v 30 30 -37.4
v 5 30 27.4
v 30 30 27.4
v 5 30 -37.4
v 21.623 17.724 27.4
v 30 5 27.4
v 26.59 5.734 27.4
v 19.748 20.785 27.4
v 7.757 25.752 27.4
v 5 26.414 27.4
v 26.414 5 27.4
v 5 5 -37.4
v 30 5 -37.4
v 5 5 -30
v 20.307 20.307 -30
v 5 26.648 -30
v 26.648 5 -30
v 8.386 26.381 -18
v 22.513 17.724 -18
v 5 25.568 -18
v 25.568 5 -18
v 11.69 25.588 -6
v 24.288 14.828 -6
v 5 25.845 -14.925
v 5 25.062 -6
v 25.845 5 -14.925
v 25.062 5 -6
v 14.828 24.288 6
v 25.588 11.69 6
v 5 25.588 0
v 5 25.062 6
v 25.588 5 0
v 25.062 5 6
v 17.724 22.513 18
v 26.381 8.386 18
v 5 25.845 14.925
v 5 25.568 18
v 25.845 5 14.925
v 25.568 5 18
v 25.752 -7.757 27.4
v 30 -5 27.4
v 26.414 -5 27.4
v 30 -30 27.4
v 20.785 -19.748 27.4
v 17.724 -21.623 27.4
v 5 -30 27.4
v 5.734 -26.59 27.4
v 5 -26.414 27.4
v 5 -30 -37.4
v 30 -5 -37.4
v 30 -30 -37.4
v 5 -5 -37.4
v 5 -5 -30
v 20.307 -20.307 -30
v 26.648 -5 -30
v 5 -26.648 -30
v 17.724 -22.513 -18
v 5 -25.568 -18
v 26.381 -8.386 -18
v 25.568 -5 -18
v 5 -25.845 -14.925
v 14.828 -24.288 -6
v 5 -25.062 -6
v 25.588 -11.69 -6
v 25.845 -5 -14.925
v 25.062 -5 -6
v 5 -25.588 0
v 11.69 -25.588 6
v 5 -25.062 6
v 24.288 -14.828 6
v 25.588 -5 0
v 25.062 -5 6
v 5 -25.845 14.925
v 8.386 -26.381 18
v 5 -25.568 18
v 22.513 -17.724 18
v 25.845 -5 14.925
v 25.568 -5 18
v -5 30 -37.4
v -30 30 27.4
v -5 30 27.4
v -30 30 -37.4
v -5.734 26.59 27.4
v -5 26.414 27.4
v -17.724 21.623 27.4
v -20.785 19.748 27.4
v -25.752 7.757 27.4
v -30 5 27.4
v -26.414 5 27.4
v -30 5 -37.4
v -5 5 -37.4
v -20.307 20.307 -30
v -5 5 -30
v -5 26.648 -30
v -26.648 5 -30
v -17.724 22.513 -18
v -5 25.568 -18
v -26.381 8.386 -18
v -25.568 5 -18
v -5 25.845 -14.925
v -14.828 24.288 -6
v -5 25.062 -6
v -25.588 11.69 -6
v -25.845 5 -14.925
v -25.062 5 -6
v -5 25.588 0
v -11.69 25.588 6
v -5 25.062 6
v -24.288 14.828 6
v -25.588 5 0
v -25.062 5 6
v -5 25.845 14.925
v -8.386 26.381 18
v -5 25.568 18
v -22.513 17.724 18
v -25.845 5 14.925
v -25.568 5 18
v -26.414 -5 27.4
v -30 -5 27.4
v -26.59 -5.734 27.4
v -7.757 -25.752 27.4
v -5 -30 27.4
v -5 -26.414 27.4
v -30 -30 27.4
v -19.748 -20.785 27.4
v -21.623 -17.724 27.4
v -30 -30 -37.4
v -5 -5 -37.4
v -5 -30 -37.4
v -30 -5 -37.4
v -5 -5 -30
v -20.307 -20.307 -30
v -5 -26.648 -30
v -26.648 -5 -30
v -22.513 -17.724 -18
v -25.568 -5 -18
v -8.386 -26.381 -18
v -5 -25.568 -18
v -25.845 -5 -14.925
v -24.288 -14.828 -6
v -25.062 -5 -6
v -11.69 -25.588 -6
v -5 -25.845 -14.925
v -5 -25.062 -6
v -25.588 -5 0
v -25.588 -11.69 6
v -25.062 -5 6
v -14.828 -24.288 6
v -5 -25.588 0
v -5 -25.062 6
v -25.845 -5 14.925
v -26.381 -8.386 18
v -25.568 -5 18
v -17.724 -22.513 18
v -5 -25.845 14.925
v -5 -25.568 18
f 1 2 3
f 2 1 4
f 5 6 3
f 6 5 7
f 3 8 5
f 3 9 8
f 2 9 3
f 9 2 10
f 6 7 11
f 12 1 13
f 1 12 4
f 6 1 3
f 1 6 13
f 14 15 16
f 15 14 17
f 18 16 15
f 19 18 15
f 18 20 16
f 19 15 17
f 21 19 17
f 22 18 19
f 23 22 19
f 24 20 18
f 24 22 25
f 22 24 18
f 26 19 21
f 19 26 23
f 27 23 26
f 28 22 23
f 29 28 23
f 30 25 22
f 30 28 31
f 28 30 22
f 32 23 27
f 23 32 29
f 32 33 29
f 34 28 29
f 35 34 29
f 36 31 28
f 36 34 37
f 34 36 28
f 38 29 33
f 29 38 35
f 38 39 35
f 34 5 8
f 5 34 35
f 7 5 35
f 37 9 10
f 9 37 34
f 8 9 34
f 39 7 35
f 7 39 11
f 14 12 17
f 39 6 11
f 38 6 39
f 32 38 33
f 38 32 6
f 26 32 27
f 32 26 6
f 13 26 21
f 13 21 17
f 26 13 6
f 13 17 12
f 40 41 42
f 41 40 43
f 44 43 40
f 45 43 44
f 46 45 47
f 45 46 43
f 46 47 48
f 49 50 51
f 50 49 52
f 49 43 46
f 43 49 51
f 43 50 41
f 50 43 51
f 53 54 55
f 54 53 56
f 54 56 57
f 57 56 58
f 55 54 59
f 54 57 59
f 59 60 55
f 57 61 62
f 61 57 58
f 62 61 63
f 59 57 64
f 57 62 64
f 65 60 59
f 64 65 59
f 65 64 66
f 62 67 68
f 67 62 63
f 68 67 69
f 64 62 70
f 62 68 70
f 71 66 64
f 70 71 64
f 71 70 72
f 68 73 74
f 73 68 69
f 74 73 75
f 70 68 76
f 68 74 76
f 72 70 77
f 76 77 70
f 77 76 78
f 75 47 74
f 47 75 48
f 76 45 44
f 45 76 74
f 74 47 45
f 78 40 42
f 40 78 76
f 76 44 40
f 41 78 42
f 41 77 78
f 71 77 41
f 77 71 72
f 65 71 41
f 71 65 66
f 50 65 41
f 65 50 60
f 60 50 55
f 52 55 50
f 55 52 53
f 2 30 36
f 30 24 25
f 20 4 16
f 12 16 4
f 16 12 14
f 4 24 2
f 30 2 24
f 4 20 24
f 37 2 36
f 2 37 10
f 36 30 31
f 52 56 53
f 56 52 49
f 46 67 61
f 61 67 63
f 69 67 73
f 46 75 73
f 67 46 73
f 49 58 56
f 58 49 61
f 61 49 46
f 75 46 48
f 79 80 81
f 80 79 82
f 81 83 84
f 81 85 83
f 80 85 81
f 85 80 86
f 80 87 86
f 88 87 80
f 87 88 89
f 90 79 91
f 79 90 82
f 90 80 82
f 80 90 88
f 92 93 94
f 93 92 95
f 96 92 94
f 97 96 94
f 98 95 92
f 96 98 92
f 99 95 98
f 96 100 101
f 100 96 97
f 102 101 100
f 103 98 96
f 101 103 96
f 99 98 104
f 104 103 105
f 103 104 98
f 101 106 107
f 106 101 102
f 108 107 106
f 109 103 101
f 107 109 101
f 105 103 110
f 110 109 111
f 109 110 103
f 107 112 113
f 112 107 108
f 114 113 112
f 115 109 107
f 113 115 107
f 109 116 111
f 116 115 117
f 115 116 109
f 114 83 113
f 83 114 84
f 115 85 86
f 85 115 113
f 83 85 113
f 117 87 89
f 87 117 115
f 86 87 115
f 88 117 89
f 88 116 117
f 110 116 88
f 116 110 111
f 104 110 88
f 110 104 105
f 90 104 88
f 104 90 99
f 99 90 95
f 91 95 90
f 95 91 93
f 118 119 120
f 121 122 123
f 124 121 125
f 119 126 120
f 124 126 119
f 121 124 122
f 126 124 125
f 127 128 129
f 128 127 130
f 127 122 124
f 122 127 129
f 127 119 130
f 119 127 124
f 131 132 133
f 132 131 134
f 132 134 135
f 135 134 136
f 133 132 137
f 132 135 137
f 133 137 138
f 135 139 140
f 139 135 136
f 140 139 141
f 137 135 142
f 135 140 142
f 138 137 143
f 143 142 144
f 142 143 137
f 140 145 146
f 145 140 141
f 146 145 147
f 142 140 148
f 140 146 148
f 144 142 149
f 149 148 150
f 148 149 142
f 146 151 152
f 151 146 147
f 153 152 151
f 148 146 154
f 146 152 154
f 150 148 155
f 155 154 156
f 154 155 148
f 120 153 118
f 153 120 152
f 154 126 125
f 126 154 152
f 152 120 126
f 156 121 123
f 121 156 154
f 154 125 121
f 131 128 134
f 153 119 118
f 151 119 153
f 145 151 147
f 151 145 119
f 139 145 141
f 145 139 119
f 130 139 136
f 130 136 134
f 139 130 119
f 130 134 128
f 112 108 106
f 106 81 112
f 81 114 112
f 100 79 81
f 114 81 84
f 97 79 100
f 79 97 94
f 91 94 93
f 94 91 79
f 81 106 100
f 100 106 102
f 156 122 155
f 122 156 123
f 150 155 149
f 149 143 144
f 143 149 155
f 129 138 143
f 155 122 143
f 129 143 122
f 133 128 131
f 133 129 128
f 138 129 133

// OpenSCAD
// file: ../lib/extrude_directional.scad
/*
Copyright (C) Saeed Gholami Shahbandi. All rights reserved.
Author: Saeed Gholami Shahbandi (saeed.gh.sh@gmail.com)

This file is part of Arrangement Library.
The of Arrangement Library is free software: you can redistribute it and/or
modify it under the terms of the GNU Lesser General Public License as published
by the Free Software Foundation, either version 3 of the License,
or (at your option) any later version.

This program is distributed in the hope that it will be useful, but WITHOUT ANY
WARRANTY; without even the implied warranty of MERCHANTABILITY or FITNESS FOR A
PARTICULAR PURPOSE. See the GNU Lesser General Public License for more details.

You should have received a copy of the GNU Lesser General Public License along
with this program. If not, see <http://www.gnu.org/licenses/>
*/
tol = 0.01;

// Extrudes the shadow of the object projected at yz plan
module extrude_along_x(length=0)
{
    union(){
        // original object
        children();
        
        // extrusion of the object
        translate([max(0, length), 0, 0])
        rotate([0, -90, 0])
        linear_extrude(height=abs(length), center=false)
        projection()
        rotate([0, 90, 0])
        children();
    }    
}

// Extrudes the shadow of the object projected at zx plan
module extrude_along_y(length=0)
{
    union(){
        // original object
        children();
        
        // extrusion of the object
        rotate([-sign(length) * 90, 0, 0])
        linear_extrude(height=abs(length), center=false)
        projection()
        rotate([sign(length) * 90, 0, 0])
        children();
    }    
}

// Extrudes the shadow of the object projected at xy plan
module extrude_along_z(length=0)
{
    union(){
        // original object
        children();
        
        // extrusion of the object
        translate([0, 0, min(0, length)])
        linear_extrude(height=abs(length), center=false)
        projection()
        children();
    }    
}

// examples
module toy_example(size=5)
{
    union(){
        cube(2*size, true);

        translate([size, 0, 0])
        sphere(size);
        translate([-size, 0, 0])
        sphere(size);
        
        translate([0, size, 0])
        sphere(size);
        translate([0, -size, 0])
        sphere(size);
        
        translate([0, 0, size])
        sphere(size);
        translate([0, 0, -size])
        sphere(size);
    }
}


%extrude_along_x(length=20)
translate([0, 20, 0])
toy_example(size=5);

%extrude_along_y(length=20)
translate([0, 0, 20])
toy_example(size=5);

%extrude_along_z(length=20)
translate([20, 0, 0])
toy_example(size=5);
// file: ../lib/splitter.scad
/*
Copyright (C) Saeed Gholami Shahbandi. All rights reserved.
Author: Saeed Gholami Shahbandi (saeed.gh.sh@gmail.com)

This file is part of Arrangement Library.
The of Arrangement Library is free software: you can redistribute it and/or
modify it under the terms of the GNU Lesser General Public License as published
by the Free Software Foundation, either version 3 of the License,
or (at your option) any later version.

This program is distributed in the hope that it will be useful, but WITHOUT ANY
WARRANTY; without even the implied warranty of MERCHANTABILITY or FITNESS FOR A
PARTICULAR PURPOSE. See the GNU Lesser General Public License for more details.

You should have received a copy of the GNU Lesser General Public License along
with this program. If not, see <http://www.gnu.org/licenses/>
*/
tol = 0.01;
use <extrude_directional.scad>

// Retuns a split of the object[s], cut by the yz plane
// If offset is set, the split parts are spaced accordingly for better visual
module split_along_yz(max_size, offset=0)
{
    // split along x=0
    union(){
        // positive side
        translate([offset, 0, 0])
        intersection()
        {
            translate([max_size/2, 0, 0])
            cube(max_size, true);
            children();
        }
        
        // negative side
        translate([-offset, 0, 0])
        intersection()
        {
            translate([-max_size/2, 0, 0])
            cube(max_size, true);
            children();
        }
    }    
}

// examples
%split_along_yz(max_size=20, offset=1)
toy_example(size=5);
// file: ../lib/shapes.scad
/*
Copyright (C) Saeed Gholami Shahbandi. All rights reserved.
Author: Saeed Gholami Shahbandi (saeed.gh.sh@gmail.com)

This file is part of Arrangement Library.
The of Arrangement Library is free software: you can redistribute it and/or
modify it under the terms of the GNU Lesser General Public License as published
by the Free Software Foundation, either version 3 of the License,
or (at your option) any later version.

This program is distributed in the hope that it will be useful, but WITHOUT ANY
WARRANTY; without even the implied warranty of MERCHANTABILITY or FITNESS FOR A
PARTICULAR PURPOSE. See the GNU Lesser General Public License for more details.

You should have received a copy of the GNU Lesser General Public License along
with this program. If not, see <http://www.gnu.org/licenses/>
*/
tol = 0.01;

// Returns a regular polygon, centered at origin, where radius is the
// distance from center to the middle of edges
module regularPolygon(order, radius)
{
    // the radius is from center to middle of edge
    // node_radius is from center to node
    node_radius = radius / cos(360 / (order * 2));
    nodes = [
        for (i = [0 : order-1])
        [node_radius * cos(i * (360/order)),
         node_radius * sin(i * (360/order))]
    ];
    polygon(nodes);
}
// main file
use <../lib/shapes.scad>
use <../lib/splitter.scad>

tol = 0.2;
thickness = 5;
height = 60;
radius = 20;
slices = 5; // number of intermediate points along the Z axis of the extrusion
num_faces = 20; // no effect when slice is specified!?
twist = 45;
convexity = 10;
s = 1; // will scale the top of the extrude wrt bottom (making cone or funnel shapes)

color_alpha = 0.9;

split_along_yz(max_size=2*height, offset=5)
rotate([0,0,90])
split_along_yz(max_size=2*height, offset=5)
difference(){
     // mold body
     color("Blue", color_alpha)
          translate([0, 0, -thickness])
          cube([2*(radius+thickness), 2*(radius+thickness), height+thickness-tol], center=true);
     
     // candle shape
     color("Red", color_alpha)
     linear_extrude(
          height=height,
          center=true,
          convexity=convexity,
          twist=twist,
          slices=slices,
          scale=s,
          $fn=num_faces
          )
          regularPolygon(order=8, radius=radius);
}
